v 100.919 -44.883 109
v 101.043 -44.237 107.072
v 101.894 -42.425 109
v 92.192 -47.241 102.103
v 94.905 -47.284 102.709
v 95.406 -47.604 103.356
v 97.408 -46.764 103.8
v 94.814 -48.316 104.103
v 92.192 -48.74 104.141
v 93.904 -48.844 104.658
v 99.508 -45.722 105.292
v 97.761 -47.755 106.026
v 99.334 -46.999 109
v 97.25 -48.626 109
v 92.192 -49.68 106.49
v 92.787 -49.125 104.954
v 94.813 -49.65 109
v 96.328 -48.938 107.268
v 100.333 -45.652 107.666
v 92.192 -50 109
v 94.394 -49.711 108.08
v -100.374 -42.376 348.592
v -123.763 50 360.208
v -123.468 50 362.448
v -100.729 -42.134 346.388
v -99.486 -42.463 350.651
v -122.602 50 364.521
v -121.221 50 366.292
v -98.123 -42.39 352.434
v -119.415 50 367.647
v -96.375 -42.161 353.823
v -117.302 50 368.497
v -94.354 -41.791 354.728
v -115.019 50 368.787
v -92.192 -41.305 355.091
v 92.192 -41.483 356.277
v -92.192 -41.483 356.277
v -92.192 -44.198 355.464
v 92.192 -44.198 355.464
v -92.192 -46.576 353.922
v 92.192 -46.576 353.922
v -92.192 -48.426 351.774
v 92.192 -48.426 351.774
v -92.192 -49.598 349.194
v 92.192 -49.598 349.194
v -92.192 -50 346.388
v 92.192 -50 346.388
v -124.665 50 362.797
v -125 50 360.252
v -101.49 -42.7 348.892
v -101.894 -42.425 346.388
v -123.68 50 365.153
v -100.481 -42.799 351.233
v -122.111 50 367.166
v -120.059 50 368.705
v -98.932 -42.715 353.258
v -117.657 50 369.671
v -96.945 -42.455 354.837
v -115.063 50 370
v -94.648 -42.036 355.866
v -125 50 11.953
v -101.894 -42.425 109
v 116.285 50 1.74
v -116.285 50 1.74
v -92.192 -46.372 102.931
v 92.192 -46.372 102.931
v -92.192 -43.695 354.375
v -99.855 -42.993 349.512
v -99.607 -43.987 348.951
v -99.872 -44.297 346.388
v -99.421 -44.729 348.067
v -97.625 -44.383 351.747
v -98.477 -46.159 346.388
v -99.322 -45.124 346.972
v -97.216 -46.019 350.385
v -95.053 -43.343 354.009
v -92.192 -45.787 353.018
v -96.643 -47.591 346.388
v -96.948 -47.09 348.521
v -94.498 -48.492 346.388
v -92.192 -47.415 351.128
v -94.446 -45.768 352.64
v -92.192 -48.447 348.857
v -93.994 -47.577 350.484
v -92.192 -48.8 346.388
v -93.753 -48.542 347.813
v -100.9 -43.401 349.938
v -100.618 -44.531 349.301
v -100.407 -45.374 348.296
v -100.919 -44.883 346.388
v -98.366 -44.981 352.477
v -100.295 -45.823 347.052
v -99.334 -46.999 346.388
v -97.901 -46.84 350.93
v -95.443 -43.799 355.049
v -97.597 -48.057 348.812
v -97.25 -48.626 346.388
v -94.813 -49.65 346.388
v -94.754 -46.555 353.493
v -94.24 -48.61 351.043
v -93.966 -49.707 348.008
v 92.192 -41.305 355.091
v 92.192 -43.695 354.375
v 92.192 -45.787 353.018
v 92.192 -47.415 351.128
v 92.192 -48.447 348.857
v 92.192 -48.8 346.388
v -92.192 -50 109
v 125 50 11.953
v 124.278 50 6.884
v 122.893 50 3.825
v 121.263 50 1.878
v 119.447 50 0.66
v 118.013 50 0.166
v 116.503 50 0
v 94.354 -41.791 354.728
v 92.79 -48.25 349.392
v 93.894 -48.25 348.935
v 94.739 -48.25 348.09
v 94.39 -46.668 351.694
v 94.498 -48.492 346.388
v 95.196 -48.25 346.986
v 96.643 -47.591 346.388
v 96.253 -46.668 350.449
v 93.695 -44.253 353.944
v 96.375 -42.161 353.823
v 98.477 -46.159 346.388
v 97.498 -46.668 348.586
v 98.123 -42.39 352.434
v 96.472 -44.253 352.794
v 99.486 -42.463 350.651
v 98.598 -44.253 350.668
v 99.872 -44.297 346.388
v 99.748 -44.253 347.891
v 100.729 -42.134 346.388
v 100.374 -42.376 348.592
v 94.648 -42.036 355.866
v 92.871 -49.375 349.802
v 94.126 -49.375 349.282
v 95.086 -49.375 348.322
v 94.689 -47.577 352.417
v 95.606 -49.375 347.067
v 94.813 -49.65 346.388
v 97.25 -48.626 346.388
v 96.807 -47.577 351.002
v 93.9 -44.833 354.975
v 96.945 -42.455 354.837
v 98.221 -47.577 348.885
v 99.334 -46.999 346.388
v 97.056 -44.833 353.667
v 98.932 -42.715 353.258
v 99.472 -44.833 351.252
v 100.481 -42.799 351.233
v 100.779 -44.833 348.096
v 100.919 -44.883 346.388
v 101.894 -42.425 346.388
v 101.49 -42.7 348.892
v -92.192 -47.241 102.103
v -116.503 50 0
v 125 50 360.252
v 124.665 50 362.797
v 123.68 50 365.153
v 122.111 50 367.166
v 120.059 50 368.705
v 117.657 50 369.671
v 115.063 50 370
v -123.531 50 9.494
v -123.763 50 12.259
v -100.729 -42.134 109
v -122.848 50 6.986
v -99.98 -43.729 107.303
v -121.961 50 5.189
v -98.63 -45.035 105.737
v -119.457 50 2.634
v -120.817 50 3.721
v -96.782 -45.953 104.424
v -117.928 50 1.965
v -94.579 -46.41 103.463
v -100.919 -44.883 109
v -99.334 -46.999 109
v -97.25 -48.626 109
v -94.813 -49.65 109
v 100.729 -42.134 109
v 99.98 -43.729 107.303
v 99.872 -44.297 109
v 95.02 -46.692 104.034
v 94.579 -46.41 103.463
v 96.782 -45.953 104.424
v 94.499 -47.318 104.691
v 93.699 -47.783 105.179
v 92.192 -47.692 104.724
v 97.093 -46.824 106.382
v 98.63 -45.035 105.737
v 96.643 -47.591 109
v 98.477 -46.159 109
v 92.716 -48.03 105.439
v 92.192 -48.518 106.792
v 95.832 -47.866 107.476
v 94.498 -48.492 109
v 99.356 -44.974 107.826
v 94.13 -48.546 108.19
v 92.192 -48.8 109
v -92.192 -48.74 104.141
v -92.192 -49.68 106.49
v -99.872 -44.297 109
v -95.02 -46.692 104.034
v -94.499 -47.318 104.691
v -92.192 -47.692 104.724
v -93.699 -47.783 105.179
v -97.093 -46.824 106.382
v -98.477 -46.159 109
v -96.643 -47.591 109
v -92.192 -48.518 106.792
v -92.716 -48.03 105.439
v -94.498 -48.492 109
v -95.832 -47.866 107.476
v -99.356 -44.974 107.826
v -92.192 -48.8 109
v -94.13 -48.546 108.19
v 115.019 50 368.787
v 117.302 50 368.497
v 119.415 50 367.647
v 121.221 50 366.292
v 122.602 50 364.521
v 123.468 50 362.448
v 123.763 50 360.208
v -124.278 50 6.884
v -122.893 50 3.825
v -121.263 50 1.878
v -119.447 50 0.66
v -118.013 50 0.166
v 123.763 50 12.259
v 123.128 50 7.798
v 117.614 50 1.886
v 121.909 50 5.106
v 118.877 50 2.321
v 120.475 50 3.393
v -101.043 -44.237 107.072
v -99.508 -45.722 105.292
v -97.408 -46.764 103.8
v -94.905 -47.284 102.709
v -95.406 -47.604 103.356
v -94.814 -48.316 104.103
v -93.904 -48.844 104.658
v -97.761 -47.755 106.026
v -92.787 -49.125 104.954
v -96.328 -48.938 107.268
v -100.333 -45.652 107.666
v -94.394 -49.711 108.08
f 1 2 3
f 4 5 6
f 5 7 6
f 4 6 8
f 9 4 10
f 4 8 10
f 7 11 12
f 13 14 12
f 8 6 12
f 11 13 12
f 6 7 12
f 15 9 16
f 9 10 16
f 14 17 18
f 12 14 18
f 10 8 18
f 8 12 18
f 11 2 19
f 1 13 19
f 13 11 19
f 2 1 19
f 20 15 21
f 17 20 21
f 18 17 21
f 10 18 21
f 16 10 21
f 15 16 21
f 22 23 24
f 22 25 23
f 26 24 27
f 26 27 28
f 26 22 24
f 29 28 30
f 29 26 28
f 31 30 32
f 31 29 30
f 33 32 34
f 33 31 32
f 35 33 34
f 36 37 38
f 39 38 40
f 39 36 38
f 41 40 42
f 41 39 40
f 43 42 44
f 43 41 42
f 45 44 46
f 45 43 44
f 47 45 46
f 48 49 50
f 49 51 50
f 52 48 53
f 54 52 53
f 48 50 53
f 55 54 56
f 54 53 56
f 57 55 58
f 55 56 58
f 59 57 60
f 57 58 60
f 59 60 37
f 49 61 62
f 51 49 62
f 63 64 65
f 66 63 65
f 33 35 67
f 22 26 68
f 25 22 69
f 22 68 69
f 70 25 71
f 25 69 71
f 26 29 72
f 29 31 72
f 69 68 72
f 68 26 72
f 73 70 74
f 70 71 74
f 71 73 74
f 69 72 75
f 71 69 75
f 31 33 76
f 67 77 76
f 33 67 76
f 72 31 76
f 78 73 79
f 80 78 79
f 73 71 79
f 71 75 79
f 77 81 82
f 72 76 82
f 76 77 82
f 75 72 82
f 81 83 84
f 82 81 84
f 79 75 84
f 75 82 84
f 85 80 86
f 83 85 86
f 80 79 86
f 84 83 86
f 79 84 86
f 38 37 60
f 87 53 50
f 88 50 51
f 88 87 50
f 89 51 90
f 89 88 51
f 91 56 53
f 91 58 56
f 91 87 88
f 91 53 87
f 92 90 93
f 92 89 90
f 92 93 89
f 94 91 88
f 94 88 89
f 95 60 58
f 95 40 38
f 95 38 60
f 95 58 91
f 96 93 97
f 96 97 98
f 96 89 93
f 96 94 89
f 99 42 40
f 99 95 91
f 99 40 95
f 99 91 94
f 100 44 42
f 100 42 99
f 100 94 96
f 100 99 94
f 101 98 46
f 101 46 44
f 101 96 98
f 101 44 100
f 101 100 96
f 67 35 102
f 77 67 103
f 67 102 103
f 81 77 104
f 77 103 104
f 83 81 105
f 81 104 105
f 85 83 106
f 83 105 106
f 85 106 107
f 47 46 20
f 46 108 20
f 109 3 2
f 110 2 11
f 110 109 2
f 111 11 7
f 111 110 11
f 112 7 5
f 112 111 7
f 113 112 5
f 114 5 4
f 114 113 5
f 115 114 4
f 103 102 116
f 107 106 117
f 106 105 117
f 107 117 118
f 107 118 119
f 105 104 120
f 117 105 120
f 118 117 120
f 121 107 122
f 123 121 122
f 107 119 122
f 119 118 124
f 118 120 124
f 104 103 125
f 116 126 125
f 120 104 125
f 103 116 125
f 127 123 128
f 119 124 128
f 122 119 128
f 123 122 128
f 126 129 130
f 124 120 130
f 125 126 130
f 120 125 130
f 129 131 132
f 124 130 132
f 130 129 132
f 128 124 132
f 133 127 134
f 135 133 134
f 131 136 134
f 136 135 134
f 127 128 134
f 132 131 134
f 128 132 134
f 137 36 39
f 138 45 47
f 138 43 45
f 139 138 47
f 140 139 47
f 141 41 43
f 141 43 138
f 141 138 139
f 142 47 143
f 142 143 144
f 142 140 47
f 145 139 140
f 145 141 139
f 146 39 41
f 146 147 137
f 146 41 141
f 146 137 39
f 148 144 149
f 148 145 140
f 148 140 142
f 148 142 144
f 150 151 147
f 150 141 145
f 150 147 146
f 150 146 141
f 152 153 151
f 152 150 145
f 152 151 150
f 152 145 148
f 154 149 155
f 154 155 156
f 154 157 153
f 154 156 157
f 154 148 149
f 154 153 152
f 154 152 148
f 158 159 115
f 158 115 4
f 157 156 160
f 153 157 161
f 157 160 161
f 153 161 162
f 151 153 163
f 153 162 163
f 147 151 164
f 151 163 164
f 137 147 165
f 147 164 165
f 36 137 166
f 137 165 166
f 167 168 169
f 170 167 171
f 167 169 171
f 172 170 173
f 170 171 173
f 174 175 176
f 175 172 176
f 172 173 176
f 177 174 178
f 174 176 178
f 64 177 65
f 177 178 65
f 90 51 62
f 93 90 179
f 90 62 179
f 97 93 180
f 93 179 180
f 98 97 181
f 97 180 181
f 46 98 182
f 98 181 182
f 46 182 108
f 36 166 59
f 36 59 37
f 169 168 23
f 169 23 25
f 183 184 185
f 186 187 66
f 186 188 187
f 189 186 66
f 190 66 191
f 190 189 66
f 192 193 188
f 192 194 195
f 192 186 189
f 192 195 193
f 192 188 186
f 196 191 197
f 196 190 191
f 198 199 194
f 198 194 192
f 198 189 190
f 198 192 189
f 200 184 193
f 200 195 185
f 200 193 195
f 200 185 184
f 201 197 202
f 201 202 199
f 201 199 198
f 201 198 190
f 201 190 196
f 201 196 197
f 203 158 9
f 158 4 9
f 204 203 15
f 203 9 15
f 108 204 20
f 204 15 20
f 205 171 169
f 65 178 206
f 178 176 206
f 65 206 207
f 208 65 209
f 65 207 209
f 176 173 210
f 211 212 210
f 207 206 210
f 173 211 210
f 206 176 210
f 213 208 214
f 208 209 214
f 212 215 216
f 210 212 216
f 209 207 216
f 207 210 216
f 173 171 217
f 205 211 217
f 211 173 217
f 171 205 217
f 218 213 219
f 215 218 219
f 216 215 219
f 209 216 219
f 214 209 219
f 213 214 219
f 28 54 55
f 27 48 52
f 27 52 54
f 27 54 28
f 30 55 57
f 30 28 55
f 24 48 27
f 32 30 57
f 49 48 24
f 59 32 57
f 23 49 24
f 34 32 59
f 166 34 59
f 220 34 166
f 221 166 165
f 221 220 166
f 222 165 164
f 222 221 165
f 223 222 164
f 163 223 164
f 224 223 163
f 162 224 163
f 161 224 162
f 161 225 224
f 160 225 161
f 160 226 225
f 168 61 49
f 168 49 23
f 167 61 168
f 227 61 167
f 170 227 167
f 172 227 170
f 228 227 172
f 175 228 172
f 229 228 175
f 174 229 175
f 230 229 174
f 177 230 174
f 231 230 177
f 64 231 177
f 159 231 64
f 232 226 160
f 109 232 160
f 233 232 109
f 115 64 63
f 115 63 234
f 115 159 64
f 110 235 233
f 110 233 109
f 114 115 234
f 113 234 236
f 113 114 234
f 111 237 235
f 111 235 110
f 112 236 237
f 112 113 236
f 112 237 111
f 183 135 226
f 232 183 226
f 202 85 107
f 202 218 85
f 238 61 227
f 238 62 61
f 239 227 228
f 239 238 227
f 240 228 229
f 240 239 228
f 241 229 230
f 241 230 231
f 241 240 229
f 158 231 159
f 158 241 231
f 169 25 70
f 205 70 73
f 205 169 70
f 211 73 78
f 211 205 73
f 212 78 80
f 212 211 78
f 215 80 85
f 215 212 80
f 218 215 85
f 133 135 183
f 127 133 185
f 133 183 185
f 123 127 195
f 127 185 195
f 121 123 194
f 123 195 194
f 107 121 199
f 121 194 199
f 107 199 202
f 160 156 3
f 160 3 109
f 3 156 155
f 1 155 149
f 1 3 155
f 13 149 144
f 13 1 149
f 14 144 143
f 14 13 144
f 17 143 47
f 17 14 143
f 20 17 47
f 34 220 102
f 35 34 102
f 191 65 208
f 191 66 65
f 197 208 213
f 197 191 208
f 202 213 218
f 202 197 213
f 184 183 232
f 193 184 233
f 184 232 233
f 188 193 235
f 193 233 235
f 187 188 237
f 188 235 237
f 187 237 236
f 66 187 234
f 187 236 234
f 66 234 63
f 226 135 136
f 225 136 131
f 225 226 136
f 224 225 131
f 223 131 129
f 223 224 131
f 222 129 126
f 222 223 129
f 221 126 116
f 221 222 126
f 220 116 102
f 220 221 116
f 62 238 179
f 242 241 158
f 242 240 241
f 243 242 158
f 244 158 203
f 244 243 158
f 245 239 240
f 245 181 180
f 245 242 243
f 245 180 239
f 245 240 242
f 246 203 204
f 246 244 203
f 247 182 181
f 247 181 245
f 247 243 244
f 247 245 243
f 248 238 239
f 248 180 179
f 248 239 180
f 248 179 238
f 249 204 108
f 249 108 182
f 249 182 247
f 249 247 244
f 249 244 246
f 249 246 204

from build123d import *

# Parameters (mm, degrees)
SKETCH_1_W          = 250
SKETCH_1_H          = 100
EXTRUDE_1_DEPTH     = 370
CUT_EXTRUDE_1_DEPTH = 370
CUT_EXTRUDE_3_DEPTH = 458.602447546
FILLET_1_R          = 10
SHELL_2_T           = -1.2


with BuildPart() as part:
    # 草圖1 → 填料-伸長1 (new body)
    with BuildSketch(Plane.XY):
        Rectangle(SKETCH_1_W, SKETCH_1_H)
    extrude(amount=EXTRUDE_1_DEPTH)

    # 草圖2 → 除料-伸長1 (cut)
    with BuildSketch(Plane.XY.offset(370)):
        Polygon((-125, 50), (-100, -50), (-125, -50), align=None)
        Polygon((125, 50), (125, -50), (100, -50), align=None)
    extrude(amount=-CUT_EXTRUDE_1_DEPTH, mode=Mode.SUBTRACT)

    # 草圖7 → 除料-伸長3 (cut, through all)
    with BuildSketch(Plane(origin=(-125, 50, 370), x_dir=(0, 0, 1), z_dir=(-1, 0, 0))):
        Polygon((0, 0), (-15, -100), (0, -100), align=None)
        Polygon((-370, 0), (-265, -100), (-370, -100), align=None)
    extrude(amount=-CUT_EXTRUDE_3_DEPTH, mode=Mode.SUBTRACT)

    # 圓角1
    fillet_1_edges = [part.edges().sort_by_distance(p)[0] for p in [
        (112.5, 0, 362.5),
        (0, -50, 355),
        (-112.5, 0, 362.5),
        (100, -50, 230),
        (112.5, 0, 52.5),
        (-100, -50, 230),
        (-112.5, 0, 52.5),
        (0, -50, 105),
    ]]
    fillet(fillet_1_edges, radius=FILLET_1_R)

    # 薄殼2
    shell_2_openings = [part.faces().sort_by_distance(p)[0] for p in [
        (0, 50, 185.000169968),
    ]]
    offset(amount=SHELL_2_T, openings=shell_2_openings, kind=Kind.INTERSECTION)


solid = part.part
